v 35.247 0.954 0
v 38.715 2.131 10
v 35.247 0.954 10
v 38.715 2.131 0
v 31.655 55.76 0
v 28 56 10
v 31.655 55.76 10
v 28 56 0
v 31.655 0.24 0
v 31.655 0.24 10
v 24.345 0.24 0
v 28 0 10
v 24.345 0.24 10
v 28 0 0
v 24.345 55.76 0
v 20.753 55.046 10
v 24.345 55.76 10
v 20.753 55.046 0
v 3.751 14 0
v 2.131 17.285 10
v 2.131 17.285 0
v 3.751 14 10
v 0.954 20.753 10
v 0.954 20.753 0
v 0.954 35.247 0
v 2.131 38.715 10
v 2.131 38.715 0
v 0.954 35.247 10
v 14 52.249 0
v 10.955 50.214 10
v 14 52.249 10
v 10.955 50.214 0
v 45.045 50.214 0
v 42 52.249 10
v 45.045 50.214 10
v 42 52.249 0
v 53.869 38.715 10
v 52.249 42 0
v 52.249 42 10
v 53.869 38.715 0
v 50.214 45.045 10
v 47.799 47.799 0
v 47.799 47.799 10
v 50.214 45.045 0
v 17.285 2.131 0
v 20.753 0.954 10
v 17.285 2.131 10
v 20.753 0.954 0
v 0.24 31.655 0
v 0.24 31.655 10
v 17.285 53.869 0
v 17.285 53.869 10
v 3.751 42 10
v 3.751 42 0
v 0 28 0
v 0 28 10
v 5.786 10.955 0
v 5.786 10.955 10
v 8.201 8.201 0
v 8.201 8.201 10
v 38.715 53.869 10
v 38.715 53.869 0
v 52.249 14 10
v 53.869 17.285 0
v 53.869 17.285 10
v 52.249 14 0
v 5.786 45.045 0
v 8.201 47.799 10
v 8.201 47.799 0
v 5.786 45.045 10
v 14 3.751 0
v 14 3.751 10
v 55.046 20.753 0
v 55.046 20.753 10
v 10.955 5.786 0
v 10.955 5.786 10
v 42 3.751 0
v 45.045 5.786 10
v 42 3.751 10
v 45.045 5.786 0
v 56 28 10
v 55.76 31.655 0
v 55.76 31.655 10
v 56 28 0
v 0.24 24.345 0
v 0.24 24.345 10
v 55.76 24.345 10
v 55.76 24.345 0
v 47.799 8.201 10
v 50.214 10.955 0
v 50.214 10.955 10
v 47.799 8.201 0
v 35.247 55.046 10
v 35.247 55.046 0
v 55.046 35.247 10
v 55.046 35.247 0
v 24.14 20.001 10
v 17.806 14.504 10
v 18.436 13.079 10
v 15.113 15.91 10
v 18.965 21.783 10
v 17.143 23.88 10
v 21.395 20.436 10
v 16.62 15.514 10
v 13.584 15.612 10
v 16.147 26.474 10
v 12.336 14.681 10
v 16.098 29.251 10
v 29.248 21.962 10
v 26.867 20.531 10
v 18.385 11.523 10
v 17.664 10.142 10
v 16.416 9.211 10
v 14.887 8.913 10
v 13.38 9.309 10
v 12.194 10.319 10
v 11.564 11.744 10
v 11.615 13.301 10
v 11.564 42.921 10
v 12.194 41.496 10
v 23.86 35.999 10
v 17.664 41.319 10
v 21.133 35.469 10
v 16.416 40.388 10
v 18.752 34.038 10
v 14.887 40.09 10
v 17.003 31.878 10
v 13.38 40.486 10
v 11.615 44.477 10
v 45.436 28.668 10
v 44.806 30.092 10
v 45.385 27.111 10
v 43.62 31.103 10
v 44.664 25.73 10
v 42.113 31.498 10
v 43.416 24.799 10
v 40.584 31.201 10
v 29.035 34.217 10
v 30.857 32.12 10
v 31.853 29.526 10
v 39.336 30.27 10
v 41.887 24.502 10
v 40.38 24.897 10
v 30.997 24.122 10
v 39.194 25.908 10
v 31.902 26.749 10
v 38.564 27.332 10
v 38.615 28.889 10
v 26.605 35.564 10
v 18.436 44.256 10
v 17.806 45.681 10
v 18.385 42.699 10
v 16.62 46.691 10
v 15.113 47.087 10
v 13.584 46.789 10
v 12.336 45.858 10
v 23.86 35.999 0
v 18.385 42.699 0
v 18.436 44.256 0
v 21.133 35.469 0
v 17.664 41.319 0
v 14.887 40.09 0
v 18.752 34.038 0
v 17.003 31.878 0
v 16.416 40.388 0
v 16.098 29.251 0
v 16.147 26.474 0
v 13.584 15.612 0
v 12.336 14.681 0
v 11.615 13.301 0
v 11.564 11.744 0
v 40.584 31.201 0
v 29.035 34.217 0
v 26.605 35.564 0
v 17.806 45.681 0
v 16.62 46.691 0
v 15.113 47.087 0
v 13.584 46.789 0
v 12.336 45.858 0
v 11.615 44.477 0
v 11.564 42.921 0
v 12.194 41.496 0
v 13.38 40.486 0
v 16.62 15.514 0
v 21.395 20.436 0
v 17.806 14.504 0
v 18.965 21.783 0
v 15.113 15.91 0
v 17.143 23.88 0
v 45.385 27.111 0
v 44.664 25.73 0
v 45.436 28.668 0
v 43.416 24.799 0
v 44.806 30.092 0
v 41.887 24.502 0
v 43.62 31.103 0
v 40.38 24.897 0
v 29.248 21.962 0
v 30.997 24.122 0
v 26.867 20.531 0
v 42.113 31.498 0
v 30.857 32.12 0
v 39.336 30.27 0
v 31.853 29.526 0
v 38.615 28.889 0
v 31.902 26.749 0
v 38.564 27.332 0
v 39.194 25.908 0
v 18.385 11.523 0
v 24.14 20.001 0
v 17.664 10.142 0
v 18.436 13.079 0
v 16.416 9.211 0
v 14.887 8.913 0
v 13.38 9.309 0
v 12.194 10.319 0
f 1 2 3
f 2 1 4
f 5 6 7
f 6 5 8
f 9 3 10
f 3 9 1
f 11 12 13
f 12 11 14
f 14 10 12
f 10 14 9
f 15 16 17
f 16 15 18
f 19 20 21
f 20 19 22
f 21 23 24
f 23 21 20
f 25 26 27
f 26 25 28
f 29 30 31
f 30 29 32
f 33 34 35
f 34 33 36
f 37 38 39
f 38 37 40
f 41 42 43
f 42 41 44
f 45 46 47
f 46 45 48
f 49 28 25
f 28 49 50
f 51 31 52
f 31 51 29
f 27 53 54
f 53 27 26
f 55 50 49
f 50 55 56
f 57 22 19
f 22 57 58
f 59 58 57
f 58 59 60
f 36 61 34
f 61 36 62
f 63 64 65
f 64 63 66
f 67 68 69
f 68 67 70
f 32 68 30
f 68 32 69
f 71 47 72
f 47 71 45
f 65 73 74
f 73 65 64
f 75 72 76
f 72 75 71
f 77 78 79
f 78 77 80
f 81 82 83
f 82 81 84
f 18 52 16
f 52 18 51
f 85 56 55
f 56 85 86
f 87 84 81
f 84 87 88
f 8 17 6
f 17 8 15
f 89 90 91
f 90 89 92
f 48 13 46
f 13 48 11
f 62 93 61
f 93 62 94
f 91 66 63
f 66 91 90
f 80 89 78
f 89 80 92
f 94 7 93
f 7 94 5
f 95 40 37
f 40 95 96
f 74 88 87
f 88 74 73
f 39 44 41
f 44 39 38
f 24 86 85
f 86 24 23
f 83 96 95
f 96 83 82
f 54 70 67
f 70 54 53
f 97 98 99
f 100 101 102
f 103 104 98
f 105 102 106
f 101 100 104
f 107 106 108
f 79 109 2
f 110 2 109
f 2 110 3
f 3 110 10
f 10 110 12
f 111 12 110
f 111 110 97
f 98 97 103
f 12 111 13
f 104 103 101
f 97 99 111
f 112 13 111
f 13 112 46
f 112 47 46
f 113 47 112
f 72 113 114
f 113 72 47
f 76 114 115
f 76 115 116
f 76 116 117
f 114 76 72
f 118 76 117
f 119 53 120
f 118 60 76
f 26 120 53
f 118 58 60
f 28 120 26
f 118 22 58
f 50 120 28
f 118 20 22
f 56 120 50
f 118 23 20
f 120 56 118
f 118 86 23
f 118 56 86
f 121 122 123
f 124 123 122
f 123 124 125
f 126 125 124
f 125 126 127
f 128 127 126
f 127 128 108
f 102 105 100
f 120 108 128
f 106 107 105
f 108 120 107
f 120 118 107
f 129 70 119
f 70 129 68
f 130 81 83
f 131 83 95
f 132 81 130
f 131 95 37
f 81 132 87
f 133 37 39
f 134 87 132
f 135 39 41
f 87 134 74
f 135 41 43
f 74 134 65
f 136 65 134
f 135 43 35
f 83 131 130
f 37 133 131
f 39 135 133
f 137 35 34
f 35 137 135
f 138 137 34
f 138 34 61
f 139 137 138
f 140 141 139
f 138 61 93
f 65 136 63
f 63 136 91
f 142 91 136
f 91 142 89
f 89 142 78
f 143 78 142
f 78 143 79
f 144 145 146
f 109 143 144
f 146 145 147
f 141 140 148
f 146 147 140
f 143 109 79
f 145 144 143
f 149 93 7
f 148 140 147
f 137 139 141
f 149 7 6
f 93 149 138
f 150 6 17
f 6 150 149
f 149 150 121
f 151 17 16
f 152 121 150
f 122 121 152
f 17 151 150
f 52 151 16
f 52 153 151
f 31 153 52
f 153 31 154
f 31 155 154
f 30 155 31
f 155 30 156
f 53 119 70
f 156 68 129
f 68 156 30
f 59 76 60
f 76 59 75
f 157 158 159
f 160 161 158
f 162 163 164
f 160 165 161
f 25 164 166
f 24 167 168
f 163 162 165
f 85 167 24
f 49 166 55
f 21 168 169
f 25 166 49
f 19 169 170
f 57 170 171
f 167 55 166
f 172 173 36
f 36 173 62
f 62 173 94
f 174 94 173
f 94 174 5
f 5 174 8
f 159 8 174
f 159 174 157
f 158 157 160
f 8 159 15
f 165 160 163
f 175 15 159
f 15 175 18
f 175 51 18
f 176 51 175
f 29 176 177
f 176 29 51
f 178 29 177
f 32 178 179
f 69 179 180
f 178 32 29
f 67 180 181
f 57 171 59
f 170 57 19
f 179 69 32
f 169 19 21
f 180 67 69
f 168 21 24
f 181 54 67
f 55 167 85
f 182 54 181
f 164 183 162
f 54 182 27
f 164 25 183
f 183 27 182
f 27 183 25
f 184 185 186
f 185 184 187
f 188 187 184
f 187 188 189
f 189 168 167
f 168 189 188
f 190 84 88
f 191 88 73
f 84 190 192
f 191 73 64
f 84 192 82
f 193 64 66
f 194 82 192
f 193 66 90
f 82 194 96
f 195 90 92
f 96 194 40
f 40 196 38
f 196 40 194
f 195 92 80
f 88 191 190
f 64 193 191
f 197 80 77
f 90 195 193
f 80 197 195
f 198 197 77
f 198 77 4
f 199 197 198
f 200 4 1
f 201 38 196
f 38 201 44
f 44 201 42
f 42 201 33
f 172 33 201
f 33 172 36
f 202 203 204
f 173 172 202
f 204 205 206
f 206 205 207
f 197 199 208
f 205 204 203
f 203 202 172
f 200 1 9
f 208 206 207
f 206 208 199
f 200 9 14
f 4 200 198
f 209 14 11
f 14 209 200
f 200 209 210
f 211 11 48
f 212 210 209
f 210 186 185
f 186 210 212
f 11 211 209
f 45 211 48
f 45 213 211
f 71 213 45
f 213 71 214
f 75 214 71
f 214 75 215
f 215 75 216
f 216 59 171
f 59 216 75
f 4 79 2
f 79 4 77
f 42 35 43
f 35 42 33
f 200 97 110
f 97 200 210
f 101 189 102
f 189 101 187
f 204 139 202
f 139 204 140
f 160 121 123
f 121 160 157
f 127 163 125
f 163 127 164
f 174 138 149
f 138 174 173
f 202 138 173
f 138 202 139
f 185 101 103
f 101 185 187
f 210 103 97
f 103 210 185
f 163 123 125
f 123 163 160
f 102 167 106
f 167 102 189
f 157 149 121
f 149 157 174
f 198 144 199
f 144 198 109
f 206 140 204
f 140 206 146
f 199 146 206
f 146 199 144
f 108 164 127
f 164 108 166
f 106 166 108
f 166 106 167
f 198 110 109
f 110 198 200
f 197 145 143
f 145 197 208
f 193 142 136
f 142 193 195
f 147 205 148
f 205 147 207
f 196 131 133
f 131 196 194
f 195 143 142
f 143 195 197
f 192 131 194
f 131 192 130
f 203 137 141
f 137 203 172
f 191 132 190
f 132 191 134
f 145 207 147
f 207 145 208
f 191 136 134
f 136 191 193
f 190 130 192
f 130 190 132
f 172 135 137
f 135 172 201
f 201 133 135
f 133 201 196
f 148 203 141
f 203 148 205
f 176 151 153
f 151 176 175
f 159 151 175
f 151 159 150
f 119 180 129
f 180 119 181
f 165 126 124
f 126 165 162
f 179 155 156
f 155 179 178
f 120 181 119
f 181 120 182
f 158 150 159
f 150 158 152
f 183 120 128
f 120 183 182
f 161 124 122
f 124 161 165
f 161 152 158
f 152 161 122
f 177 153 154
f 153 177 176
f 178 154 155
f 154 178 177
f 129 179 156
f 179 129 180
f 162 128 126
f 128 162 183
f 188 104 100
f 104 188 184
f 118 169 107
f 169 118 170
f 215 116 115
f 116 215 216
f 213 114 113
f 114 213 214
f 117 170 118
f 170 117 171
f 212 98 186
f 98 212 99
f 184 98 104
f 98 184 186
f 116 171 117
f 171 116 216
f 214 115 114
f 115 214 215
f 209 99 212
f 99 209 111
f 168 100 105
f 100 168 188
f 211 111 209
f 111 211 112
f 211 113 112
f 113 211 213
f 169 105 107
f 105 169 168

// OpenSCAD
$fn = 32;

// ----------------------------------------------------------------------
// Cam plate: eccentric cam, base R28
// ----------------------------------------------------------------------

// --- parameters (mm) ---
base_r = 28;              // base circle radius
lobe_h = 14;              // cam lobe rise
bore_r = 8;               // shaft bore radius
plate_t = 10;             // plate thickness, Z (extrusion height)
ecc = 4;                  // disc eccentricity
ring_r = 18;              // lightening ring radius
bolt_r = 3.5;             // lightening hole radius
fit_tol = 0.1;            // declared fit tolerance (prompt contract)
free_tol = 0.3;           // declared free tolerance (prompt contract)

profile = [[56, 28], [55.76, 31.655], [55.046, 35.247], [53.869, 38.715], [52.249, 42], [50.214, 45.045], [47.799, 47.799], [45.045, 50.214], [42, 52.249], [38.715, 53.869], [35.247, 55.046], [31.655, 55.76], [28, 56], [24.345, 55.76], [20.753, 55.046], [17.285, 53.869], [14, 52.249], [10.955, 50.214], [8.201, 47.799], [5.786, 45.045], [3.751, 42], [2.131, 38.715], [0.954, 35.247], [0.24, 31.655], [0, 28], [0.24, 24.345], [0.954, 20.753], [2.131, 17.285], [3.751, 14], [5.786, 10.955], [8.201, 8.201], [10.955, 5.786], [14, 3.751], [17.285, 2.131], [20.753, 0.954], [24.345, 0.24], [28, 0], [31.655, 0.24], [35.247, 0.954], [38.715, 2.131], [42, 3.751], [45.045, 5.786], [47.799, 8.201], [50.214, 10.955], [52.249, 14], [53.869, 17.285], [55.046, 20.753], [55.76, 24.345]];  // primary outline, 48 points, counter clockwise
void_1 = [[31.853, 29.526], [30.857, 32.12], [29.035, 34.217], [26.605, 35.564], [23.86, 35.999], [21.133, 35.469], [18.752, 34.038], [17.003, 31.878], [16.098, 29.251], [16.147, 26.474], [17.143, 23.88], [18.965, 21.783], [21.395, 20.436], [24.14, 20.001], [26.867, 20.531], [29.248, 21.962], [30.997, 24.122], [31.902, 26.749]];  // shaft bore, 18 points
void_2 = [[45.436, 28.668], [44.806, 30.092], [43.62, 31.103], [42.113, 31.498], [40.584, 31.201], [39.336, 30.27], [38.615, 28.889], [38.564, 27.332], [39.194, 25.908], [40.38, 24.897], [41.887, 24.502], [43.416, 24.799], [44.664, 25.73], [45.385, 27.111]];  // lightening hole 1, 14 points
void_3 = [[18.436, 44.256], [17.806, 45.681], [16.62, 46.691], [15.113, 47.087], [13.584, 46.789], [12.336, 45.858], [11.615, 44.477], [11.564, 42.921], [12.194, 41.496], [13.38, 40.486], [14.887, 40.09], [16.416, 40.388], [17.664, 41.319], [18.385, 42.699]];  // lightening hole 2, 14 points
void_4 = [[18.436, 13.079], [17.806, 14.504], [16.62, 15.514], [15.113, 15.91], [13.584, 15.612], [12.336, 14.681], [11.615, 13.301], [11.564, 11.744], [12.194, 10.319], [13.38, 9.309], [14.887, 8.913], [16.416, 9.211], [17.664, 10.142], [18.385, 11.523]];  // lightening hole 3, 14 points

// --- the one profile operation ---
difference() {
  linear_extrude(height = plate_t) polygon(points = profile);
  translate([0, 0, -1])
    linear_extrude(height = plate_t + 2) polygon(points = void_1);
  translate([0, 0, -1])
    linear_extrude(height = plate_t + 2) polygon(points = void_2);
  translate([0, 0, -1])
    linear_extrude(height = plate_t + 2) polygon(points = void_3);
  translate([0, 0, -1])
    linear_extrude(height = plate_t + 2) polygon(points = void_4);
}
